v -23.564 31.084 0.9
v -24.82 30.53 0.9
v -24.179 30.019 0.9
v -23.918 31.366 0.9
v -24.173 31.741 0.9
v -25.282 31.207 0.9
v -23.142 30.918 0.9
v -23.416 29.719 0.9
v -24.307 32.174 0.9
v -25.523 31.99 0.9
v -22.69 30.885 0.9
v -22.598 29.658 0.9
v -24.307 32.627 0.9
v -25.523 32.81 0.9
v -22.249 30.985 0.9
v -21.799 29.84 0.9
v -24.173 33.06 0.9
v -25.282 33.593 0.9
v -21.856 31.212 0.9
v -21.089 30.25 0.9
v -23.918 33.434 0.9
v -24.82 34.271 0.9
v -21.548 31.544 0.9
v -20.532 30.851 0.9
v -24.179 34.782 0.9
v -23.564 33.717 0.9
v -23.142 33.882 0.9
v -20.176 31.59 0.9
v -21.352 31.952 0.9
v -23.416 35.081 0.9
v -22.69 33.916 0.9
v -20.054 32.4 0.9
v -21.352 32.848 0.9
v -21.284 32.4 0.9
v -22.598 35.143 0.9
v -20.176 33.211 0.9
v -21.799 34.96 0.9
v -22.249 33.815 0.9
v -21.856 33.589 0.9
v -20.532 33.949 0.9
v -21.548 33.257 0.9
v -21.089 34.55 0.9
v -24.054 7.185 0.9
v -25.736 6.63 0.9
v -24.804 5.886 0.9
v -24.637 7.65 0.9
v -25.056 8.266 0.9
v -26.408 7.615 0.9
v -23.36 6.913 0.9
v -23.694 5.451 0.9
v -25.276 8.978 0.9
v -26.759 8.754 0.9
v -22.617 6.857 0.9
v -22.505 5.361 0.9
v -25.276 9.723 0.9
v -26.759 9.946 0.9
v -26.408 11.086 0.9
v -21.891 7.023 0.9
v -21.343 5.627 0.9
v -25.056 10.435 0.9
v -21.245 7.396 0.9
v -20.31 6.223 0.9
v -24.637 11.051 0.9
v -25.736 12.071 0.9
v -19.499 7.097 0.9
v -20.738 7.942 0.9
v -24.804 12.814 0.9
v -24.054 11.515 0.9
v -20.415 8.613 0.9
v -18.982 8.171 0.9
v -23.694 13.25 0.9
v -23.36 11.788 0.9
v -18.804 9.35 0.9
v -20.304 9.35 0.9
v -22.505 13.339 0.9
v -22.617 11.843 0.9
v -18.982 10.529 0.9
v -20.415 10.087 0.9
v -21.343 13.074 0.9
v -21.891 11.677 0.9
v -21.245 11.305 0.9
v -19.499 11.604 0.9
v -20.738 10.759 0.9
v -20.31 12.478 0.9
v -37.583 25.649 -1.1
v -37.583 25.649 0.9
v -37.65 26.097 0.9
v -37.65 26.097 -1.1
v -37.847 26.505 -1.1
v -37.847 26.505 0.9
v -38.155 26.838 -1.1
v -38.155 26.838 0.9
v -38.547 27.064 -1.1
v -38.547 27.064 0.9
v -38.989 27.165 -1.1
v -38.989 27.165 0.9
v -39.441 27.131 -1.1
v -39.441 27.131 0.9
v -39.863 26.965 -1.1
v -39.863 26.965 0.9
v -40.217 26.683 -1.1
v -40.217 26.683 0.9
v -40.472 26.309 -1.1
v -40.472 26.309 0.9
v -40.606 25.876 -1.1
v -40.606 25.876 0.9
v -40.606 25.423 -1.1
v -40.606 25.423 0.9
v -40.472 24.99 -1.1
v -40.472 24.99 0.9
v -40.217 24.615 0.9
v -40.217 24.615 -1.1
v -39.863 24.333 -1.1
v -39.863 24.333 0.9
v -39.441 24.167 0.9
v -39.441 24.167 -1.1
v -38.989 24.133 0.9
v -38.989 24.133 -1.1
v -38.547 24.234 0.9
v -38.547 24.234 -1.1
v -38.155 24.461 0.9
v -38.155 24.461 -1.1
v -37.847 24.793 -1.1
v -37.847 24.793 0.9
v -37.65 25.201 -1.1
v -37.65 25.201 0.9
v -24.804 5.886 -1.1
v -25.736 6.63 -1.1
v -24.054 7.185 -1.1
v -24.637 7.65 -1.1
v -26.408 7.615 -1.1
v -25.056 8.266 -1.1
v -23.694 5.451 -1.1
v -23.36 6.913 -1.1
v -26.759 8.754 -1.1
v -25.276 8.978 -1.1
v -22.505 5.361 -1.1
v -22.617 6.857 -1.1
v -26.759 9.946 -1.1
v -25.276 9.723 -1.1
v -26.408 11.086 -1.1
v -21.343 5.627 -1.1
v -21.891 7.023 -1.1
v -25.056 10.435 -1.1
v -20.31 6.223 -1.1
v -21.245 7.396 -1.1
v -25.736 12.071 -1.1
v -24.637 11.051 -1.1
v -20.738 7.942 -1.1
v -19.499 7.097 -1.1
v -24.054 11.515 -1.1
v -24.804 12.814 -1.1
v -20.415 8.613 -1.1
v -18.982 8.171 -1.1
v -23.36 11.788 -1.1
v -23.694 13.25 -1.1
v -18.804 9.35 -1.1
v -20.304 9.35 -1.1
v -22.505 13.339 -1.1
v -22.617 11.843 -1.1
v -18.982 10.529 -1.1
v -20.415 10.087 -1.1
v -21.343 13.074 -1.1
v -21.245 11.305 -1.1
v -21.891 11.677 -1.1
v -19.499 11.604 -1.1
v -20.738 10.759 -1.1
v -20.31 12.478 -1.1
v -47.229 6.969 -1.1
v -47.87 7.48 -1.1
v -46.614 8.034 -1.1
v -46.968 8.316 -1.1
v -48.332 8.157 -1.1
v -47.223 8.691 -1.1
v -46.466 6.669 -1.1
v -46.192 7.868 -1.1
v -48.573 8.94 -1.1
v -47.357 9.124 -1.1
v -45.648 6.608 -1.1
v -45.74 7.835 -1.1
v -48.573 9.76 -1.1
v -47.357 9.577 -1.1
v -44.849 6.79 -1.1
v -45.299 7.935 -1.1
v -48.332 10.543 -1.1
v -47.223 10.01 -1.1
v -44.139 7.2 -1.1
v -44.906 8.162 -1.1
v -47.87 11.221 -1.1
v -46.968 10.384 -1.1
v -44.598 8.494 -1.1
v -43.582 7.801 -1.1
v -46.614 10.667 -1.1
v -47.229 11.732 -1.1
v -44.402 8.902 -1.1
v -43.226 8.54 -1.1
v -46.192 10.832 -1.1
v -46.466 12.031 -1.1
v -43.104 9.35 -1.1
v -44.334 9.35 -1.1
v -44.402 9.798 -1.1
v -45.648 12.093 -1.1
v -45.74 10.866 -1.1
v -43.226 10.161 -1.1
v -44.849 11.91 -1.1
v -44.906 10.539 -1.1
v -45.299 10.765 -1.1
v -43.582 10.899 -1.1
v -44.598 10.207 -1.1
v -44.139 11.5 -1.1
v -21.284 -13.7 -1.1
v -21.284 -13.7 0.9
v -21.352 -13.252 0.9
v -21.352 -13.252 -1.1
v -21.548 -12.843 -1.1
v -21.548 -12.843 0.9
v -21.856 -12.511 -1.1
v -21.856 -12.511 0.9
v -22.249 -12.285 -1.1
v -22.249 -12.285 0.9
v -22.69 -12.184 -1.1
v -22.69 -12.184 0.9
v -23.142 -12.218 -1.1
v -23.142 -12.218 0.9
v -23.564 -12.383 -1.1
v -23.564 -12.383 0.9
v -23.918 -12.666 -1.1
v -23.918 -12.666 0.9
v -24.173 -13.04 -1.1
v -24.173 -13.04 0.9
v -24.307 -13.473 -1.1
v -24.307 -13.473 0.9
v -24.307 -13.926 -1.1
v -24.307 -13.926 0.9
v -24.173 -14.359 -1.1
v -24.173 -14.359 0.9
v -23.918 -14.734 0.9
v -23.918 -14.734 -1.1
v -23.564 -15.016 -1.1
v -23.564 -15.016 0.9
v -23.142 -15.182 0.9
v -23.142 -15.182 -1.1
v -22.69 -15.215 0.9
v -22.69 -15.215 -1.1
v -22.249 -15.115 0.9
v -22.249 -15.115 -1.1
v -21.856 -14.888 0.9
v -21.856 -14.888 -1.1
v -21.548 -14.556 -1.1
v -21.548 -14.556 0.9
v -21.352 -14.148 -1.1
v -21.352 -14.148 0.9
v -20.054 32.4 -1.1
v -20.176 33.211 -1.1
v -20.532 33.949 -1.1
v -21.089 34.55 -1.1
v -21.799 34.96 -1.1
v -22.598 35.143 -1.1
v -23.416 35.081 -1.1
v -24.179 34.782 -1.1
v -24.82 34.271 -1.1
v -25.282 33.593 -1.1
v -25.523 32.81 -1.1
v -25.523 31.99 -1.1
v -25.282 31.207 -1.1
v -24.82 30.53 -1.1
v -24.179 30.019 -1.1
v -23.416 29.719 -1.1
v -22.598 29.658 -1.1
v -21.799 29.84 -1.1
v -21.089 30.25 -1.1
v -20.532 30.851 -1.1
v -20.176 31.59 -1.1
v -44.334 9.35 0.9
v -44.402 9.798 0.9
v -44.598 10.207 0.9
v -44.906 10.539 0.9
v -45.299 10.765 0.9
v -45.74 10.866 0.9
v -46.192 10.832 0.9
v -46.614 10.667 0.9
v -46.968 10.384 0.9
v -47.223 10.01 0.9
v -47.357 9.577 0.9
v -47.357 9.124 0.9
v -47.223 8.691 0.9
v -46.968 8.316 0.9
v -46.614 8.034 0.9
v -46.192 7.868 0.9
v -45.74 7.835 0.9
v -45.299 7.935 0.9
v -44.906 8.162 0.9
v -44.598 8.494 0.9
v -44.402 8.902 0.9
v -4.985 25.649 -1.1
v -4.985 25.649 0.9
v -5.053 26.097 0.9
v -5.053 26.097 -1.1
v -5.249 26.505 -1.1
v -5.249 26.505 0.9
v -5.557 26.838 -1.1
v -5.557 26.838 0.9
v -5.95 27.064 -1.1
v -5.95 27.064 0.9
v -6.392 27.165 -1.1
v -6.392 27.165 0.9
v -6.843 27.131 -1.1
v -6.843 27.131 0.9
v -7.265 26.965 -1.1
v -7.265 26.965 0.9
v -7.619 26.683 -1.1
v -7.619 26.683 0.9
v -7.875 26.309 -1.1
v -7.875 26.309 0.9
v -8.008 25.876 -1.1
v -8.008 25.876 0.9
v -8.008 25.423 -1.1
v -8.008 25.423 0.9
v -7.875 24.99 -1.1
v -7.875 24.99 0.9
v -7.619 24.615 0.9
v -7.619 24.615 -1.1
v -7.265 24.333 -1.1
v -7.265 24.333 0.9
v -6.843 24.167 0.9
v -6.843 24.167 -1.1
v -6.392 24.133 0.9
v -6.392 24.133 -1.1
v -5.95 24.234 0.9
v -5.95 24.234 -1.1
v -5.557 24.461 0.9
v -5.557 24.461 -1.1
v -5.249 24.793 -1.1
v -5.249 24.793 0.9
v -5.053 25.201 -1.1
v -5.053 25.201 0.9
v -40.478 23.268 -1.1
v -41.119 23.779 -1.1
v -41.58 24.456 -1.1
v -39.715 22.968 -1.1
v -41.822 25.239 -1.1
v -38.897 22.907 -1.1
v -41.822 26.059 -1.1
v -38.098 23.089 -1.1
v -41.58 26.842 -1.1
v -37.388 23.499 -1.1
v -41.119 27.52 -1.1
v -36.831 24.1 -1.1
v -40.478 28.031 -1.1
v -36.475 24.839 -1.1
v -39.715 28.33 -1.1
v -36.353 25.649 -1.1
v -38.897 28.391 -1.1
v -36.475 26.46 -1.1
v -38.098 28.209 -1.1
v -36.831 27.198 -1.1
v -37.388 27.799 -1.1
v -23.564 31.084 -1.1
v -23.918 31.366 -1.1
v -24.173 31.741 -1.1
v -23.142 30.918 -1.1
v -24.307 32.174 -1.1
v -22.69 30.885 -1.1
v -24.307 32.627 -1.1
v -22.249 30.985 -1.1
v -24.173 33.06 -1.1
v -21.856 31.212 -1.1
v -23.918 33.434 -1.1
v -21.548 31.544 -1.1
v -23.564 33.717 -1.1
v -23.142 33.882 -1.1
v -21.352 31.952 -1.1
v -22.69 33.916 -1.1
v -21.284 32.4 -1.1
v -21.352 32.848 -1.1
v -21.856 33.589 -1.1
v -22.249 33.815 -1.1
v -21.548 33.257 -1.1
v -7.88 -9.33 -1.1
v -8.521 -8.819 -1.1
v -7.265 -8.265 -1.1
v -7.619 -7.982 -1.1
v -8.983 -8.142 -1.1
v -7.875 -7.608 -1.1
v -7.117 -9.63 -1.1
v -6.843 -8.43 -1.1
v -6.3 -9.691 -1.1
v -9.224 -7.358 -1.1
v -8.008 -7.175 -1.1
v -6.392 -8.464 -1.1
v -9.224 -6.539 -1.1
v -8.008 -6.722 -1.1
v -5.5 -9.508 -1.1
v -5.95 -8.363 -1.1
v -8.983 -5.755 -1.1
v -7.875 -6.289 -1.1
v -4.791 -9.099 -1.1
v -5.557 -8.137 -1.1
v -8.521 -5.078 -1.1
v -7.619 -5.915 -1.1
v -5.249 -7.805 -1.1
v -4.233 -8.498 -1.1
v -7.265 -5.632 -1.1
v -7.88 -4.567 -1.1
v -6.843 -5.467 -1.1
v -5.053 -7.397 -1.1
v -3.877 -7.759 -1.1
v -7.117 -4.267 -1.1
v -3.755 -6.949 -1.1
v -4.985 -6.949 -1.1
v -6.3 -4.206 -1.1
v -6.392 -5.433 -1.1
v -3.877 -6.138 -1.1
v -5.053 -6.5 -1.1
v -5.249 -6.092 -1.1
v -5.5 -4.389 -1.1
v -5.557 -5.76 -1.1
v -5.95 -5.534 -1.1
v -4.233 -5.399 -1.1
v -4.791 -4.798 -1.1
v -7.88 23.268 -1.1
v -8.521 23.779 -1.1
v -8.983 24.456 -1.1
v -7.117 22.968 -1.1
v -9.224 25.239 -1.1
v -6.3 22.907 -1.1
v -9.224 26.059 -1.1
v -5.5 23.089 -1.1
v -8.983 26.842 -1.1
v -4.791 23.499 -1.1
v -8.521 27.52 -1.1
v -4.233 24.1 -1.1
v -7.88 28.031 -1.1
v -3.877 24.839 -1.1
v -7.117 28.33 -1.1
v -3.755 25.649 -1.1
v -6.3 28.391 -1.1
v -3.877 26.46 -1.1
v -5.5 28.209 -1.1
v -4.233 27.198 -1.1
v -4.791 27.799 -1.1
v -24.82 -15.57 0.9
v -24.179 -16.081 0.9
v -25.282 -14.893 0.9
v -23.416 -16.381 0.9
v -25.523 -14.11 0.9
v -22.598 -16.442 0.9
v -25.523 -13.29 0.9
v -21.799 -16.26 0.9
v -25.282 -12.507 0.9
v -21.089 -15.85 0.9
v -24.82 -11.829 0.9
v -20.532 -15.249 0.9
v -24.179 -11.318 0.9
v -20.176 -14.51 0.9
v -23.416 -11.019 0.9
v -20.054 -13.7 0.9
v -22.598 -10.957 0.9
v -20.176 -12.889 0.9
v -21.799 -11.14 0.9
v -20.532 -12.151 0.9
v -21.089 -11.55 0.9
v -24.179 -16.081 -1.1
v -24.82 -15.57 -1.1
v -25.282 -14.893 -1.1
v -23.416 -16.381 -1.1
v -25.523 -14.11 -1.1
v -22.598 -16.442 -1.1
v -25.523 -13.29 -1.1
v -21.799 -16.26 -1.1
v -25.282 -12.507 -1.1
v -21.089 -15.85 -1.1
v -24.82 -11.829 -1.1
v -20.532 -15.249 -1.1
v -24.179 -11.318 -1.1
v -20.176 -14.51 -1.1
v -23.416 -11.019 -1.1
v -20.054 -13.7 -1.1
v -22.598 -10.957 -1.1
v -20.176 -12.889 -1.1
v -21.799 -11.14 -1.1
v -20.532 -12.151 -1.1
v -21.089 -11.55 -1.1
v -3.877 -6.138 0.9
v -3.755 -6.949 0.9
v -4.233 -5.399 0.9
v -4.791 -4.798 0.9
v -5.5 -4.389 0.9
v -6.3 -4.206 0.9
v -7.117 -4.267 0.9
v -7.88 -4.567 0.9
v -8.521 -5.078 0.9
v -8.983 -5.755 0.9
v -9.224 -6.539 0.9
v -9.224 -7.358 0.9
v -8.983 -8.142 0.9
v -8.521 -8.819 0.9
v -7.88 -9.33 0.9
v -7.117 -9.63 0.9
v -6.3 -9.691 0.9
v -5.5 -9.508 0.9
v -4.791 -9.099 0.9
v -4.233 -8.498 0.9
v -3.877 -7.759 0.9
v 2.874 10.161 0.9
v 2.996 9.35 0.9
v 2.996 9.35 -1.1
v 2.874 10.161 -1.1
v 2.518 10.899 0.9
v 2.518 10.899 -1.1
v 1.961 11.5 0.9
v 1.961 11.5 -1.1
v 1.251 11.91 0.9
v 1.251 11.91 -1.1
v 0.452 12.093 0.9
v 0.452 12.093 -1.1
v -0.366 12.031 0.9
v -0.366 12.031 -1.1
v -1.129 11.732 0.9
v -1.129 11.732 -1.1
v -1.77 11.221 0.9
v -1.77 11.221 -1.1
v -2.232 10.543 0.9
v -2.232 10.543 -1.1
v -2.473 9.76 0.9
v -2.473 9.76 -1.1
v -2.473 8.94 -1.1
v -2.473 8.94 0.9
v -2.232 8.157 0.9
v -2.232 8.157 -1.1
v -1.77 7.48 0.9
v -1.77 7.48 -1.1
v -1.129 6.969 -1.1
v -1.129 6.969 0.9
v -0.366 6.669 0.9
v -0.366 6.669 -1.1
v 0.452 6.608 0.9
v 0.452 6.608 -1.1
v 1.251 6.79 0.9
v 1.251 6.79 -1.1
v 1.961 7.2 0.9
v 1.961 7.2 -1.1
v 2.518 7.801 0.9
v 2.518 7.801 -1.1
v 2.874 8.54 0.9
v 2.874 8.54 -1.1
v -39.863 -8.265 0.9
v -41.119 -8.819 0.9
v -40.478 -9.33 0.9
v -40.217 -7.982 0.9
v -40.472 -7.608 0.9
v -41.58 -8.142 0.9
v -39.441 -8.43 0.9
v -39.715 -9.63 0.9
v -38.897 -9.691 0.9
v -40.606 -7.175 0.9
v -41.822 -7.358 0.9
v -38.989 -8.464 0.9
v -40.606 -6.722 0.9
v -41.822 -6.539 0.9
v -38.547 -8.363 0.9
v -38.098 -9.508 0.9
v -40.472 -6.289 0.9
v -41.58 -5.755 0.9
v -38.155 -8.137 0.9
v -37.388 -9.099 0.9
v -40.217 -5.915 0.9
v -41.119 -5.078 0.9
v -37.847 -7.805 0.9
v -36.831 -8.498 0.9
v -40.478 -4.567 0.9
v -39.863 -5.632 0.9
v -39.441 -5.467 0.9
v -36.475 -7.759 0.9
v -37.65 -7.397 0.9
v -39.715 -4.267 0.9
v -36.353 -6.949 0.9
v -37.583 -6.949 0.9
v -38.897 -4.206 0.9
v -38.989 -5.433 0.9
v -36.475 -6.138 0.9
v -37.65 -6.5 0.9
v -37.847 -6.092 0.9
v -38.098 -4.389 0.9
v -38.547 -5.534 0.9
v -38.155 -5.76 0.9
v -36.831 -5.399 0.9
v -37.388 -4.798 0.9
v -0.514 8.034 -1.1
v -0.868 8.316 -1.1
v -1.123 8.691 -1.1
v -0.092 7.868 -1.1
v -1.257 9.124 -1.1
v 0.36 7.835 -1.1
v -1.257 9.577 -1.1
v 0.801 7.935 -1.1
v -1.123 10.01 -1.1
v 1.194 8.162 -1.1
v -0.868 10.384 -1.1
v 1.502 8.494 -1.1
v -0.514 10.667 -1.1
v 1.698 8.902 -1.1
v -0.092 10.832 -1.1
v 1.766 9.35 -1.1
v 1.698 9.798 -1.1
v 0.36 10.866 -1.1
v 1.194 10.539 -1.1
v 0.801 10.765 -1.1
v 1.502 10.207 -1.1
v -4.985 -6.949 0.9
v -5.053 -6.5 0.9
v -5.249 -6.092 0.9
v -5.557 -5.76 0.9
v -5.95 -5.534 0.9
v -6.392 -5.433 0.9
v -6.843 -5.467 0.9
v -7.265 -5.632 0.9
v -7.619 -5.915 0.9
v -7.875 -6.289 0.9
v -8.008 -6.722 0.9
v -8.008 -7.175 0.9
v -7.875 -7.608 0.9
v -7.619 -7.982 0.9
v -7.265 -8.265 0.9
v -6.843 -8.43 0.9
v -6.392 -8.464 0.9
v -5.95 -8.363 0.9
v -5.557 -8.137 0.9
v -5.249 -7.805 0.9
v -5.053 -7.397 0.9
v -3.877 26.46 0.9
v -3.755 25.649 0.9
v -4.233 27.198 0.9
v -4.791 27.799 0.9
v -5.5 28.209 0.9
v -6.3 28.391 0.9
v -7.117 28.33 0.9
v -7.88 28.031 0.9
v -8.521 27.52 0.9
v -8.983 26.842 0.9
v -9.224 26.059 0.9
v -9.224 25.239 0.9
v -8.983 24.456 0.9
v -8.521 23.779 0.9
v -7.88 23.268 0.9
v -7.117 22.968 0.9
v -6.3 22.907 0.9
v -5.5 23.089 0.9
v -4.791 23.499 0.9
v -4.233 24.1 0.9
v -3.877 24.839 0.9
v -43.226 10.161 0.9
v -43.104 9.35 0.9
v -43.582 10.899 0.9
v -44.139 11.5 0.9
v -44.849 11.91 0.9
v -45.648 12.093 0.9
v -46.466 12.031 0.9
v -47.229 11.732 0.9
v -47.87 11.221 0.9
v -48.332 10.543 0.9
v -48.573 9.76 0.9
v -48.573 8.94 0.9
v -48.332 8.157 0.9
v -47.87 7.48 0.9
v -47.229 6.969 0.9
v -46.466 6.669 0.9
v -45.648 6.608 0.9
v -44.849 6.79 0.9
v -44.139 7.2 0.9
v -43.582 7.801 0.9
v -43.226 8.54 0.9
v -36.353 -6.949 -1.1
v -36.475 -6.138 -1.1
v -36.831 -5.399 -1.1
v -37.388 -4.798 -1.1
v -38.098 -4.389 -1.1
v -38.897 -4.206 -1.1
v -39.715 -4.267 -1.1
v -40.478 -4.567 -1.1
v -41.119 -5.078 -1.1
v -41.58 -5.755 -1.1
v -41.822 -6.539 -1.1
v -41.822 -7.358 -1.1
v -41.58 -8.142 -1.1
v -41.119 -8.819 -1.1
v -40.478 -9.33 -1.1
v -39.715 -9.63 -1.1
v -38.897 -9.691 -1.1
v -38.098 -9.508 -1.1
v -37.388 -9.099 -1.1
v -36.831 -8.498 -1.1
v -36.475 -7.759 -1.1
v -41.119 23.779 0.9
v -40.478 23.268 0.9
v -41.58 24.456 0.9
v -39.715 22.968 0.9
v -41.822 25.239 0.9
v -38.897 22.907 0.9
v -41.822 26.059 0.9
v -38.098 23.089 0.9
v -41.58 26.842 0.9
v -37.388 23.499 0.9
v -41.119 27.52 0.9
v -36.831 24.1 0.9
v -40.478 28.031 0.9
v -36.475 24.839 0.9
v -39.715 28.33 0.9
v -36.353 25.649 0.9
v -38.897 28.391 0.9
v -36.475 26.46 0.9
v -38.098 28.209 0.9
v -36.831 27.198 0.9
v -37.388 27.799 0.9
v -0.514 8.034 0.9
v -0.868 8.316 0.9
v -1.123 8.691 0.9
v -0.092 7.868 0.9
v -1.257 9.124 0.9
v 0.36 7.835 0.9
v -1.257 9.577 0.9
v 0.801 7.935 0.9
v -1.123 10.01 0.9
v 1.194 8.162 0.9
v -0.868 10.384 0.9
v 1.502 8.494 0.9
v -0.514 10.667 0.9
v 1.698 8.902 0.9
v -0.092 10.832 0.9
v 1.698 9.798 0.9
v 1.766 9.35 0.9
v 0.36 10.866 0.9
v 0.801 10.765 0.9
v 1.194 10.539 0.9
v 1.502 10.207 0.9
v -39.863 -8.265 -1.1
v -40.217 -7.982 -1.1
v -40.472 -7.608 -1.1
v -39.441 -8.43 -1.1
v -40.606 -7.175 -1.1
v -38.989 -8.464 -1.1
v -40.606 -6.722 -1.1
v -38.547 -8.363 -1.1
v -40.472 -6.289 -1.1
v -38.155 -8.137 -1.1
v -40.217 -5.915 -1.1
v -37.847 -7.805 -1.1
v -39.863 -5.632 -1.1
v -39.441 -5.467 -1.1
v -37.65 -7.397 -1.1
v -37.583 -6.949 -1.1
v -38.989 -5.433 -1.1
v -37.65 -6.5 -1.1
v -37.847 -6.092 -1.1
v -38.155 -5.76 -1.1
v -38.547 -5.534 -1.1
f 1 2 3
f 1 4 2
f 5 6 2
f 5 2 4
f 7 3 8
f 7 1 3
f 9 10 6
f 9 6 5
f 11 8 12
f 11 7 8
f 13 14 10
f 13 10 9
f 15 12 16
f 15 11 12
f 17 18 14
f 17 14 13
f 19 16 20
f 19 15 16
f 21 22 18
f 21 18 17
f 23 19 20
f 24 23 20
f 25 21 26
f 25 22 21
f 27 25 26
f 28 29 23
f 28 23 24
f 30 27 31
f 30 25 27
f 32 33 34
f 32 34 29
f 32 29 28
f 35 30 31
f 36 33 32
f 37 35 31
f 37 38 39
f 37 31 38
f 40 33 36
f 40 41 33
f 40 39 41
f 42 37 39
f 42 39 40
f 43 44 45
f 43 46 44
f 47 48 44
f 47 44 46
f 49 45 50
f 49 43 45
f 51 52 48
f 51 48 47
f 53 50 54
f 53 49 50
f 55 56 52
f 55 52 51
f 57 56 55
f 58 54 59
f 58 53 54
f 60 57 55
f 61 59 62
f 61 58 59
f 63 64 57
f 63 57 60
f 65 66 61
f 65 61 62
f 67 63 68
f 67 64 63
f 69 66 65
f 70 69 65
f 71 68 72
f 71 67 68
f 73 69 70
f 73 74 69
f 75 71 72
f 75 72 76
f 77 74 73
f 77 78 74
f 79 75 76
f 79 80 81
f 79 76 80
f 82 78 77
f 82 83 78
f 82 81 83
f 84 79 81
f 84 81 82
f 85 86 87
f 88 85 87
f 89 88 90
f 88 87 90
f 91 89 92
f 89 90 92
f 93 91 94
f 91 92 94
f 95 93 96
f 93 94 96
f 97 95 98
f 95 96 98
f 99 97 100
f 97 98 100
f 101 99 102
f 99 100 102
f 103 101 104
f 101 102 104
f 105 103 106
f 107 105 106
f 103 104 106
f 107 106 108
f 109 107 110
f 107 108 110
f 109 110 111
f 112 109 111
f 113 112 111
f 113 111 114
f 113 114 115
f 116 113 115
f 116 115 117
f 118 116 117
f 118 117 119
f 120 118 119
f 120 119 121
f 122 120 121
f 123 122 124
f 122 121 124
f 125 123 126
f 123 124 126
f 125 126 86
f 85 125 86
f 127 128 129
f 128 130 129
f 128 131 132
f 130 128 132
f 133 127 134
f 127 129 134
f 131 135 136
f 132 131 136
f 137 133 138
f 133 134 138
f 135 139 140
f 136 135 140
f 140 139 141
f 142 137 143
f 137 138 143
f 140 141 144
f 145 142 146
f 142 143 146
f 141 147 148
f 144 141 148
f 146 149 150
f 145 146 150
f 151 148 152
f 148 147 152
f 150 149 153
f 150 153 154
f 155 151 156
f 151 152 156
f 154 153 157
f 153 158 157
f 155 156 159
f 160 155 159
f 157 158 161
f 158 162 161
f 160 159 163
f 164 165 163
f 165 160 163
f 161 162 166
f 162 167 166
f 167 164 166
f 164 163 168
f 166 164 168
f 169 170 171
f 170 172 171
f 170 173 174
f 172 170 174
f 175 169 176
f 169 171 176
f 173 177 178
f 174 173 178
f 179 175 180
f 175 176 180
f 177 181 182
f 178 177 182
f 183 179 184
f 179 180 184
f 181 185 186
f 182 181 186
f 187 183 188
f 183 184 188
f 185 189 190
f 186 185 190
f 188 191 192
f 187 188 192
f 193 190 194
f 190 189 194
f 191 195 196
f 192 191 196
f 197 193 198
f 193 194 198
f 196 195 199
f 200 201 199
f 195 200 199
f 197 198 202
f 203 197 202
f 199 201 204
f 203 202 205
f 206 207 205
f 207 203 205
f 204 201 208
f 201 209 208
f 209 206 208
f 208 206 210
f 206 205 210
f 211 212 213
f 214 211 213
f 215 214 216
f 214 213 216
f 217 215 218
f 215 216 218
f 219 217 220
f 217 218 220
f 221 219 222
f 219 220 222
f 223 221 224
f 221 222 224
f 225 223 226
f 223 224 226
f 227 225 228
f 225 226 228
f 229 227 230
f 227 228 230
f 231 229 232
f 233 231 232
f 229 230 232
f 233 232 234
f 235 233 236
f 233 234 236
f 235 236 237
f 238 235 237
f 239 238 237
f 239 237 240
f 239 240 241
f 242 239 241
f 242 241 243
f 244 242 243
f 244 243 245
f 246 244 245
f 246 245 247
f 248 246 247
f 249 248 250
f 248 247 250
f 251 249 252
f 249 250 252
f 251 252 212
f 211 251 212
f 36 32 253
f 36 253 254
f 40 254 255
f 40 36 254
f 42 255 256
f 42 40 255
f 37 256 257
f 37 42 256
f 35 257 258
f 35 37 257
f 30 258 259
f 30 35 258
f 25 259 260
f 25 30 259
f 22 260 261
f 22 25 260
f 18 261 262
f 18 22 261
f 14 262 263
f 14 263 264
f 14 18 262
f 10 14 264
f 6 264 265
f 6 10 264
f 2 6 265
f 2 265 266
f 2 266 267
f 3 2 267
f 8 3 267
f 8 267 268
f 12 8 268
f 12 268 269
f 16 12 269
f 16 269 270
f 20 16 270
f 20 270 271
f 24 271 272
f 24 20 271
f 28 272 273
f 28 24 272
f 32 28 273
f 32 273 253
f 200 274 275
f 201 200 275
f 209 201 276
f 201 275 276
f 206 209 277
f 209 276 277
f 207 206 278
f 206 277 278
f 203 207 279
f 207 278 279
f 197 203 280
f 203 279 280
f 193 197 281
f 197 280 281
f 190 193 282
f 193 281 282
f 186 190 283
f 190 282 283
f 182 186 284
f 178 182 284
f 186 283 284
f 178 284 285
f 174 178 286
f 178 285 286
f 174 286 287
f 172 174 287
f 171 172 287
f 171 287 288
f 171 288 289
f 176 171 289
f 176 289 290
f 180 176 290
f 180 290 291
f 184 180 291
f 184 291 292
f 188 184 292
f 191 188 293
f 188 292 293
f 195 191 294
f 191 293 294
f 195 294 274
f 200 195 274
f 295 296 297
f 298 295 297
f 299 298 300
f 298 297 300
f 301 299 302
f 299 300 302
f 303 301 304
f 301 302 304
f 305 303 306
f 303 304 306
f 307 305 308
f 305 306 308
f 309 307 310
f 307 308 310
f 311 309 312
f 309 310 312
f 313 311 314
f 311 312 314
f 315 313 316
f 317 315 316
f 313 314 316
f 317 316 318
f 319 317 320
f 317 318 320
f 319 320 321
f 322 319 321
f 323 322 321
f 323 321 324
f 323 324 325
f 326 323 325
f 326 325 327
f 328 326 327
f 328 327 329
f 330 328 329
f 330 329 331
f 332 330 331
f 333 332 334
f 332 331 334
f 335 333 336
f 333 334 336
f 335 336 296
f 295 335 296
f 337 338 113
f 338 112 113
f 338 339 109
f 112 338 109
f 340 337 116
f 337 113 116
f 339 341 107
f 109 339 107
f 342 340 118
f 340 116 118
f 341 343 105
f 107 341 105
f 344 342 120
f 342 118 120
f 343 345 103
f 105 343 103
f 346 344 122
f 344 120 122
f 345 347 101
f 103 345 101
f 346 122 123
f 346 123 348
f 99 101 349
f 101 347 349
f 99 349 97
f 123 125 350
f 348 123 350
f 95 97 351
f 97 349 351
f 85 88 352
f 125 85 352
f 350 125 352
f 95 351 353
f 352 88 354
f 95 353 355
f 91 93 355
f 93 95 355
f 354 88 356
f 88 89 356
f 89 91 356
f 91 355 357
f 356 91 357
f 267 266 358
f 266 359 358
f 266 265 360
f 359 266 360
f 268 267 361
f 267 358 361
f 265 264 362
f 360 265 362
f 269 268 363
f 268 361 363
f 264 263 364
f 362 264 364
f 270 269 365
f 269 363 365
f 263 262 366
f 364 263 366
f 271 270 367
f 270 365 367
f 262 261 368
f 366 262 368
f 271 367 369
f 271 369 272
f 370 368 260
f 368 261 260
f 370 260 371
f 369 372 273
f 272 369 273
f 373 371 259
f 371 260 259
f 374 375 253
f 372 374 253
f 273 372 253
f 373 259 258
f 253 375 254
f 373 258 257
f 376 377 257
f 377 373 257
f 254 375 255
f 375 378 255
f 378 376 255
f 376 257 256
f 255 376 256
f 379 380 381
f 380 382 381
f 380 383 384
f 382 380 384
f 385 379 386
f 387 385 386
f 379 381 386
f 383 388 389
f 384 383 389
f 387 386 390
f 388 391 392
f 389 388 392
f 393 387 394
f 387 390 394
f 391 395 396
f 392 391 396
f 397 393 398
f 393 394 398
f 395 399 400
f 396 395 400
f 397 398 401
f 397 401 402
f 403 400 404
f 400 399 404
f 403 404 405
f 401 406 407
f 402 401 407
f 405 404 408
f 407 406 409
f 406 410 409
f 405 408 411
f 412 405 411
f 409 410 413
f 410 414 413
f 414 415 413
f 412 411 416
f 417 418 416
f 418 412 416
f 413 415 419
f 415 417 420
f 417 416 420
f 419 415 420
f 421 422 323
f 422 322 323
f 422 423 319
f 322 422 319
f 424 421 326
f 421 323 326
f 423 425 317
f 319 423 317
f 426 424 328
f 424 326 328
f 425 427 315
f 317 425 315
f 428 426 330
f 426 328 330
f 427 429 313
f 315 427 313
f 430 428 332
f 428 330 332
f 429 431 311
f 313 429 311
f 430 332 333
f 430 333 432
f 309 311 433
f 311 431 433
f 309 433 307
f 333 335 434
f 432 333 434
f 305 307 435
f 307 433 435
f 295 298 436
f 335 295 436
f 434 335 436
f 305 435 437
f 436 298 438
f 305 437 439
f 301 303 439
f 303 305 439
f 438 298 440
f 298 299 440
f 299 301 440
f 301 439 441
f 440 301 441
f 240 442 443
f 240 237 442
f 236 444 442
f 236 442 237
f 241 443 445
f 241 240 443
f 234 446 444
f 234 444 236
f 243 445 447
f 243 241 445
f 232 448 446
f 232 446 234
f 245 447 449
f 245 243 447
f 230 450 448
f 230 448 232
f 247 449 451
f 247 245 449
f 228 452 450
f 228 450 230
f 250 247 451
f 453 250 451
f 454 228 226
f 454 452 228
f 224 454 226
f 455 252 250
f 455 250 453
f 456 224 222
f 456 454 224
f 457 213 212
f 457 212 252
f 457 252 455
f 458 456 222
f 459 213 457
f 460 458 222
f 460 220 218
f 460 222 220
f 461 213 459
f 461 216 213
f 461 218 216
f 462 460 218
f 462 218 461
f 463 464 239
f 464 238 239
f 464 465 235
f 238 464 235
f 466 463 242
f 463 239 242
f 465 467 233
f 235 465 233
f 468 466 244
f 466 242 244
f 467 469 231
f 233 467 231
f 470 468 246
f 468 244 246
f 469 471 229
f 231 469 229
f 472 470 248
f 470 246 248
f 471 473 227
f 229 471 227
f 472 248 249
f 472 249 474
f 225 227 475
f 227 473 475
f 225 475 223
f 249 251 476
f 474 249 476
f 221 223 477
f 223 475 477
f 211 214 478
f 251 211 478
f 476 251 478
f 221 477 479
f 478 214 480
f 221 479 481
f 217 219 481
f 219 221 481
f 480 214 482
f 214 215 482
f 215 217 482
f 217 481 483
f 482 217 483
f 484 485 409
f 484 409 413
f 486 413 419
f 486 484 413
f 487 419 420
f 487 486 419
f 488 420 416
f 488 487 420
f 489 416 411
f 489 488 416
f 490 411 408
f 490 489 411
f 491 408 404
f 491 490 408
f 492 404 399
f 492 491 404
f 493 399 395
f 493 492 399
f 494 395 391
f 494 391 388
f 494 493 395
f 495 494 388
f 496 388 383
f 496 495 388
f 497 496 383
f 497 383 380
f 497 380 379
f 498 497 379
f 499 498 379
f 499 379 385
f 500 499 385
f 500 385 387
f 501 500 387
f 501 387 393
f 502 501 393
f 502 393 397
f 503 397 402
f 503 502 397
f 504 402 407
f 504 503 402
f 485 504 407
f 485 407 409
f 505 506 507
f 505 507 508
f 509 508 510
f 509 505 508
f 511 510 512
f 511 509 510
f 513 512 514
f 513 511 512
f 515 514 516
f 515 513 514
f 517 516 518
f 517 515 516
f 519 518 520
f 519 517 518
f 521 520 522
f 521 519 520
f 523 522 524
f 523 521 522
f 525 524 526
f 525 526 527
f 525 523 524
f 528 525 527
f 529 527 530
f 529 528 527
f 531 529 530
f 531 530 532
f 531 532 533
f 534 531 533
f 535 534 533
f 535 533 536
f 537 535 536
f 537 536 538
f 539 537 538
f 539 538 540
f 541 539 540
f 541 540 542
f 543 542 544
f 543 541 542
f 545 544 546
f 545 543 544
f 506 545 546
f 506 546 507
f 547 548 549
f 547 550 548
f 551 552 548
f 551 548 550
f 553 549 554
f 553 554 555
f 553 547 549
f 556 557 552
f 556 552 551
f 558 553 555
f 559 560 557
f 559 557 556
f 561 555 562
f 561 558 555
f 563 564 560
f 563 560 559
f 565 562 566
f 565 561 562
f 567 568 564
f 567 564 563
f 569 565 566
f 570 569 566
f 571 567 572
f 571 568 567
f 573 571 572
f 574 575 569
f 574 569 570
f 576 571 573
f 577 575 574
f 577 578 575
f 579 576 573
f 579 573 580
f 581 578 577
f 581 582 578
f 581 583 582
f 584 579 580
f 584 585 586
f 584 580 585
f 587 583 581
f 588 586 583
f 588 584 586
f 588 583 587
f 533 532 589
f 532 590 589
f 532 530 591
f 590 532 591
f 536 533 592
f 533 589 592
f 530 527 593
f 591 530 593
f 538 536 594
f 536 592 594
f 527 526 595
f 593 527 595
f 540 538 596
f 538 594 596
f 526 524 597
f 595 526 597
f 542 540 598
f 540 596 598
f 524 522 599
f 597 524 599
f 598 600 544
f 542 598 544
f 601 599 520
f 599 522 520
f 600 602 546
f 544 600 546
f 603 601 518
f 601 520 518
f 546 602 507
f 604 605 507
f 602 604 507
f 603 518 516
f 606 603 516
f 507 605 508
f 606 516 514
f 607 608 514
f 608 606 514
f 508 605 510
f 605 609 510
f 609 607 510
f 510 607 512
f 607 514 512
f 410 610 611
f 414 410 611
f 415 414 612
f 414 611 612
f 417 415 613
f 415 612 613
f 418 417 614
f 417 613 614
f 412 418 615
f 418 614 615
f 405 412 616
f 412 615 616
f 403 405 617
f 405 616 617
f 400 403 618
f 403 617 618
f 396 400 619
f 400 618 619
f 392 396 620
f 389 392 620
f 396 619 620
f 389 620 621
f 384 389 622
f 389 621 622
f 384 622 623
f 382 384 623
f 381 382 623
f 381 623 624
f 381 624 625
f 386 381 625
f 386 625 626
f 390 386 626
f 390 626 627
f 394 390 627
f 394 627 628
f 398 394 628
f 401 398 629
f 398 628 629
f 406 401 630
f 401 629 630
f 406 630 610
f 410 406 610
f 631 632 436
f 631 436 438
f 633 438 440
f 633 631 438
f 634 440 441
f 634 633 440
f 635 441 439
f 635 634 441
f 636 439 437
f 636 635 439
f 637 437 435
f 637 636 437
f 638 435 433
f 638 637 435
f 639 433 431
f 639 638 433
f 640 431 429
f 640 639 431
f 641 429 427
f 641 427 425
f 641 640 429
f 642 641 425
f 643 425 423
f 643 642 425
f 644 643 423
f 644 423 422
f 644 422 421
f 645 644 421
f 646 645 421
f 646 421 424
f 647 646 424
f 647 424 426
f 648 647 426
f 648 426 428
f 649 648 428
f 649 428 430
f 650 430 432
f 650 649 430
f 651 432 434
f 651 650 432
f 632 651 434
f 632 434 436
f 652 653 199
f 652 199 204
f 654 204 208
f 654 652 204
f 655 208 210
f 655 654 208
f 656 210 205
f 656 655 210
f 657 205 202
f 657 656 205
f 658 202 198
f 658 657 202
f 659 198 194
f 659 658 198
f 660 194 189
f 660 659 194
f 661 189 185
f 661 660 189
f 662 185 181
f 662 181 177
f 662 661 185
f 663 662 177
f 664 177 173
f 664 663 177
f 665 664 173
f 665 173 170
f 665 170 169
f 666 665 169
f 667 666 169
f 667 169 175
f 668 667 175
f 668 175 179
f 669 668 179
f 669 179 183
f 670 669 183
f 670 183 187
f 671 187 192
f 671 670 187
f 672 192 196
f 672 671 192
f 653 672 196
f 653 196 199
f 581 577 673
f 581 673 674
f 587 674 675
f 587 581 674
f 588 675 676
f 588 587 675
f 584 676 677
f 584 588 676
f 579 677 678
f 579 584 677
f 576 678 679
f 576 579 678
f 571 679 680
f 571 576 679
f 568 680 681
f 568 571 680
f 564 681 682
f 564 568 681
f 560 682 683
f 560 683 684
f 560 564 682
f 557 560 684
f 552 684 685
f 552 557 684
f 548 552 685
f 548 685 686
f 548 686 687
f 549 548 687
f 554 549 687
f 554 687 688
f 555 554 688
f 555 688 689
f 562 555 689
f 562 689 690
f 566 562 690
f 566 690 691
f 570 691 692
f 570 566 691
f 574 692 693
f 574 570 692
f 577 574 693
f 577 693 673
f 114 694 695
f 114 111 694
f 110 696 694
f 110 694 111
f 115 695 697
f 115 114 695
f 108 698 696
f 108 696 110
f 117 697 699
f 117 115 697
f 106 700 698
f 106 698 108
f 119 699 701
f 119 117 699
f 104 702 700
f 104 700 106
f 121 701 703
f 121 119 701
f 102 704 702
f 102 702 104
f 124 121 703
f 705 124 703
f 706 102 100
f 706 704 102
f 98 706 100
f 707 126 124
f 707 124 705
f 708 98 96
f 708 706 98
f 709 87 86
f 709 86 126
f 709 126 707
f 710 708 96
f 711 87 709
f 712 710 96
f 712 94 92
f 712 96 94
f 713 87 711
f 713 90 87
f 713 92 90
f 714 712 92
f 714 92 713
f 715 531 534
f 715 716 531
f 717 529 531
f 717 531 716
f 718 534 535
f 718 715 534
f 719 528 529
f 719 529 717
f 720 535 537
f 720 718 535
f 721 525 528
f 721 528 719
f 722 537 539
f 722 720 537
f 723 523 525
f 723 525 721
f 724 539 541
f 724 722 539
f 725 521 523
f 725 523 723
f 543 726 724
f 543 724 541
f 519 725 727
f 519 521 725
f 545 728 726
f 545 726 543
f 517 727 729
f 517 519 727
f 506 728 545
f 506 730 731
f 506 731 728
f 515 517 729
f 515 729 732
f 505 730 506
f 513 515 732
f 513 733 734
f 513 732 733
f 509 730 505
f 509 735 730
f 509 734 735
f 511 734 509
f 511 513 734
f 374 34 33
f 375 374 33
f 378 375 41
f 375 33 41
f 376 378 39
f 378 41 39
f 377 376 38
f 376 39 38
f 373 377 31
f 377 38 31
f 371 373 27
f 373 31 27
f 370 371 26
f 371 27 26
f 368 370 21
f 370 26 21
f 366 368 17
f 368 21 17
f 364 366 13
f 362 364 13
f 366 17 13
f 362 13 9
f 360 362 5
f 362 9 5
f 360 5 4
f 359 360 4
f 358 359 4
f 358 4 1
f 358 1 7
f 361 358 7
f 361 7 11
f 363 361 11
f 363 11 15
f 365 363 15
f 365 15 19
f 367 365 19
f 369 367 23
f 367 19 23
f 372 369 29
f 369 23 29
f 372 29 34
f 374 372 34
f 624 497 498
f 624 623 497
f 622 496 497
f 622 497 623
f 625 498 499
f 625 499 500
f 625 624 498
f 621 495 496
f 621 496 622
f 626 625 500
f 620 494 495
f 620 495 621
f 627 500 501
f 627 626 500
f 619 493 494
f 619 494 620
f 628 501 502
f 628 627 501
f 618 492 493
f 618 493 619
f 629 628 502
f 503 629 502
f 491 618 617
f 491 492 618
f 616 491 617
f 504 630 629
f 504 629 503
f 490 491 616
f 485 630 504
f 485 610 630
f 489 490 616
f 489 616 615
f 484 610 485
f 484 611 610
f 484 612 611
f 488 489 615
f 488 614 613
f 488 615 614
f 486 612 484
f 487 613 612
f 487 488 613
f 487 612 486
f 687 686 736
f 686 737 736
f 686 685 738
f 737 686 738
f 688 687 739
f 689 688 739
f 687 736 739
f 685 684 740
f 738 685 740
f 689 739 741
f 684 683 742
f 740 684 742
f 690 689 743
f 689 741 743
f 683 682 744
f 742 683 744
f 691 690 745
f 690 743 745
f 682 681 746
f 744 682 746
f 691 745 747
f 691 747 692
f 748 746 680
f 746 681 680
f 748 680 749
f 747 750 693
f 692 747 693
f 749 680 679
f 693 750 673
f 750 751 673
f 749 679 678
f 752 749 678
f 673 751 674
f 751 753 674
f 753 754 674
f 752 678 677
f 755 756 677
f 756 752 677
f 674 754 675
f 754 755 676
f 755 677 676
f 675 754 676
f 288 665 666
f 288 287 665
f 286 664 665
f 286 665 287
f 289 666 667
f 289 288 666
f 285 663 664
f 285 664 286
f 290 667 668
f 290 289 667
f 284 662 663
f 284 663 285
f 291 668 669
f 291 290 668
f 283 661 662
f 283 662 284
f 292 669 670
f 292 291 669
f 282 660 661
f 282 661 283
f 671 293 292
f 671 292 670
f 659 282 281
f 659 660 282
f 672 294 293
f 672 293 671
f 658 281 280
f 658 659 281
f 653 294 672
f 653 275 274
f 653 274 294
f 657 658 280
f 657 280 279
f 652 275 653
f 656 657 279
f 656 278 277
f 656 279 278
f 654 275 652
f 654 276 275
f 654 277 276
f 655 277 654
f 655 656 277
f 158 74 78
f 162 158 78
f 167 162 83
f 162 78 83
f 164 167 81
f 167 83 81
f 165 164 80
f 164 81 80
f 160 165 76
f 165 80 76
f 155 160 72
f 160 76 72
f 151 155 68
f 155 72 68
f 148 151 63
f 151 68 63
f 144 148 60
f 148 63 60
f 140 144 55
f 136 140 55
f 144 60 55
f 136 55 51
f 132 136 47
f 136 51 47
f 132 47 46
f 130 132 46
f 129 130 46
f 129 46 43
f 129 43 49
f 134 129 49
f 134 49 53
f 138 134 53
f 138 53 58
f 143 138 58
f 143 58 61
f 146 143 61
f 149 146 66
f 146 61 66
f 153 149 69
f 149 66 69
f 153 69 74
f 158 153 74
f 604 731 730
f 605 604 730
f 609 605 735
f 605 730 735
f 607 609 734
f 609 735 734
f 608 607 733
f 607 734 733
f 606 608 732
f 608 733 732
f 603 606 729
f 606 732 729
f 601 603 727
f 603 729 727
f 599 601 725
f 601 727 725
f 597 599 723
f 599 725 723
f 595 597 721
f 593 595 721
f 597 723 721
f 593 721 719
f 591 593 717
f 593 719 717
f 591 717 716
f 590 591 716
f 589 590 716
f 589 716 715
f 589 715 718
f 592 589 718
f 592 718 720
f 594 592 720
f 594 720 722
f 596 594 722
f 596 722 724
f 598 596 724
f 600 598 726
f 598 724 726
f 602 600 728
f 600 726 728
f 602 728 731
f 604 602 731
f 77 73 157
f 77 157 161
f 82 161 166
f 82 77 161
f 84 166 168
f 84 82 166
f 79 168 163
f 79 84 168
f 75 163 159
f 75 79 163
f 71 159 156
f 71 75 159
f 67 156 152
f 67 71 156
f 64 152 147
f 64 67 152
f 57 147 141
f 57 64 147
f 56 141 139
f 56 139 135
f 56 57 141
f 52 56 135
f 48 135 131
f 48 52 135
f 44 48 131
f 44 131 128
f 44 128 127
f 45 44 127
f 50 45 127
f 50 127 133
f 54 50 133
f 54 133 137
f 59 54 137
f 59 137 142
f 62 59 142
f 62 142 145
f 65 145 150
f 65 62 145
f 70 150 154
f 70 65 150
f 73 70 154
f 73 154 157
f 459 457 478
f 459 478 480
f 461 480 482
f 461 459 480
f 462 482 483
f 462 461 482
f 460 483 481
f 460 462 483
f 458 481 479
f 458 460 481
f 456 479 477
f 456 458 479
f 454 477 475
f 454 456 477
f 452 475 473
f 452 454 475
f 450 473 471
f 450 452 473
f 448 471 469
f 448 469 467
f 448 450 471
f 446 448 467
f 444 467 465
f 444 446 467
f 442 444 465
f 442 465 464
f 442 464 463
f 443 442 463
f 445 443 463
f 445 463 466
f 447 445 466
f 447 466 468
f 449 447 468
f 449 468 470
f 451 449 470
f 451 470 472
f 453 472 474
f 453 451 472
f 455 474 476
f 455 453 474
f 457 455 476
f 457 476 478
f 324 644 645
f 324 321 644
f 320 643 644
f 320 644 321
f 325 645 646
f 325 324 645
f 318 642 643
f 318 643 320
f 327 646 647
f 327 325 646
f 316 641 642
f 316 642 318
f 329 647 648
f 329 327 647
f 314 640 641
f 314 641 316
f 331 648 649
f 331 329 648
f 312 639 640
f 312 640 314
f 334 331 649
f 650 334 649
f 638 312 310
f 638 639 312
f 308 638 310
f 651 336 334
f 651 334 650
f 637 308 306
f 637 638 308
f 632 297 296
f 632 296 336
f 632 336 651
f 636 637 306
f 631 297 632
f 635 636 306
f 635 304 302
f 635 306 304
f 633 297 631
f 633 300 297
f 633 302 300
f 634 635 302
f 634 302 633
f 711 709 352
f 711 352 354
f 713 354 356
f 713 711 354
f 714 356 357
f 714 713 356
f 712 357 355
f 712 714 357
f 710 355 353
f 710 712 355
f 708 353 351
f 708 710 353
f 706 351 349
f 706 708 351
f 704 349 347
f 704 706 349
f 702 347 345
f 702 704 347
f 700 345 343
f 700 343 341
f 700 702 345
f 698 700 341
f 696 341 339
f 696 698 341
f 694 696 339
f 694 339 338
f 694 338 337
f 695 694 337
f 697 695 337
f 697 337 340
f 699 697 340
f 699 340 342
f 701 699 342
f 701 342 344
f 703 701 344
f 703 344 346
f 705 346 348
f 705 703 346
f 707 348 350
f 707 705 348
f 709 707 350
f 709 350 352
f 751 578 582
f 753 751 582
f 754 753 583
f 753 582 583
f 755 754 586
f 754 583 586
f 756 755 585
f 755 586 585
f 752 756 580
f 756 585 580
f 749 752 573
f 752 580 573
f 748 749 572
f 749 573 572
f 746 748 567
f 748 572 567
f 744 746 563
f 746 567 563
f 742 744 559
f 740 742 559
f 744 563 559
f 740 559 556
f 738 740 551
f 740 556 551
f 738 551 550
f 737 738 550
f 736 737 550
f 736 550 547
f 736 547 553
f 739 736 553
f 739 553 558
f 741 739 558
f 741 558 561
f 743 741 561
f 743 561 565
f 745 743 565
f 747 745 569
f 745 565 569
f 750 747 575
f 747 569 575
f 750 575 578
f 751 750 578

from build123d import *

# Parameters (mm, degrees)
EXTRUDE_START     = 0.899582
SKETCH_1_R        = 2.75
SKETCH_1_R_2      = 1.52
EXTRUDE_1_DEPTH   = 2
EXTRUDE_1_2_DEPTH = 2
EXTRUDE_1_3_DEPTH = 2
EXTRUDE_1_4_DEPTH = 2
EXTRUDE_1_5_DEPTH = 2
EXTRUDE_1_6_DEPTH = 2
EXTRUDE_1_7_DEPTH = 2
EXTRUDE_1_8_DEPTH = 2
SKETCH_1_R_3      = 4
SKETCH_1_R_4      = 2.5
EXTRUDE_1_9_DEPTH = 2


with BuildPart() as part:
    # 草图1 → 凸台-拉伸1 (new body)
    with BuildSketch(Plane.XY.offset(EXTRUDE_START)):
        with Locations((-22.803986485, 32.400306763)):
            Circle(SKETCH_1_R)
        with Locations((-22.803986485, 32.400306763)):
            Circle(SKETCH_1_R_2, mode=Mode.SUBTRACT)
    extrude(amount=-EXTRUDE_1_DEPTH)


with BuildPart() as body_2:
    # 草图1 → Extrude 1 2 (new body)
    with BuildSketch(Plane.XY.offset(EXTRUDE_START)):
        with Locations((-6.505175448, 25.649118181)):
            Circle(SKETCH_1_R)
        with Locations((-6.505175448, 25.649118181)):
            Circle(SKETCH_1_R_2, mode=Mode.SUBTRACT)
    extrude(amount=-EXTRUDE_1_2_DEPTH)


with BuildPart() as body_3:
    # 草图1 → Extrude 1 3 (new body)
    with BuildSketch(Plane.XY.offset(EXTRUDE_START)):
        with Locations((0.246013135, 9.350307143)):
            Circle(SKETCH_1_R)
        with Locations((0.246013135, 9.350307143)):
            Circle(SKETCH_1_R_2, mode=Mode.SUBTRACT)
    extrude(amount=-EXTRUDE_1_3_DEPTH)


with BuildPart() as body_4:
    # 草图1 → Extrude 1 4 (new body)
    with BuildSketch(Plane.XY.offset(EXTRUDE_START)):
        with Locations((-6.505175448, -6.948503895)):
            Circle(SKETCH_1_R)
        with Locations((-6.505175448, -6.948503895)):
            Circle(SKETCH_1_R_2, mode=Mode.SUBTRACT)
    extrude(amount=-EXTRUDE_1_4_DEPTH)


with BuildPart() as body_5:
    # 草图1 → Extrude 1 5 (new body)
    with BuildSketch(Plane.XY.offset(EXTRUDE_START)):
        with Locations((-22.803986485, -13.699692477)):
            Circle(SKETCH_1_R)
        with Locations((-22.803986485, -13.699692477)):
            Circle(SKETCH_1_R_2, mode=Mode.SUBTRACT)
    extrude(amount=-EXTRUDE_1_5_DEPTH)


with BuildPart() as body_6:
    # 草图1 → Extrude 1 6 (new body)
    with BuildSketch(Plane.XY.offset(EXTRUDE_START)):
        with Locations((-39.102797523, -6.948503895)):
            Circle(SKETCH_1_R)
        with Locations((-39.102797523, -6.948503895)):
            Circle(SKETCH_1_R_2, mode=Mode.SUBTRACT)
    extrude(amount=-EXTRUDE_1_6_DEPTH)


with BuildPart() as body_7:
    # 草图1 → Extrude 1 7 (new body)
    with BuildSketch(Plane.XY.offset(EXTRUDE_START)):
        with Locations((-45.853986105, 9.350307143)):
            Circle(SKETCH_1_R)
        with Locations((-45.853986105, 9.350307143)):
            Circle(SKETCH_1_R_2, mode=Mode.SUBTRACT)
    extrude(amount=-EXTRUDE_1_7_DEPTH)


with BuildPart() as body_8:
    # 草图1 → Extrude 1 8 (new body)
    with BuildSketch(Plane.XY.offset(EXTRUDE_START)):
        with Locations((-39.102797523, 25.649118181)):
            Circle(SKETCH_1_R)
        with Locations((-39.102797523, 25.649118181)):
            Circle(SKETCH_1_R_2, mode=Mode.SUBTRACT)
    extrude(amount=-EXTRUDE_1_8_DEPTH)


with BuildPart() as body_9:
    # 草图1 → Extrude 1 9 (new body)
    with BuildSketch(Plane.XY.offset(EXTRUDE_START)):
        with Locations((-22.803986485, 9.350307143)):
            Circle(SKETCH_1_R_3)
        with Locations((-22.803986485, 9.350307143)):
            Circle(SKETCH_1_R_4, mode=Mode.SUBTRACT)
    extrude(amount=-EXTRUDE_1_9_DEPTH)


solid = Compound([part.part, body_2.part, body_3.part, body_4.part, body_5.part, body_6.part, body_7.part, body_8.part, body_9.part])
